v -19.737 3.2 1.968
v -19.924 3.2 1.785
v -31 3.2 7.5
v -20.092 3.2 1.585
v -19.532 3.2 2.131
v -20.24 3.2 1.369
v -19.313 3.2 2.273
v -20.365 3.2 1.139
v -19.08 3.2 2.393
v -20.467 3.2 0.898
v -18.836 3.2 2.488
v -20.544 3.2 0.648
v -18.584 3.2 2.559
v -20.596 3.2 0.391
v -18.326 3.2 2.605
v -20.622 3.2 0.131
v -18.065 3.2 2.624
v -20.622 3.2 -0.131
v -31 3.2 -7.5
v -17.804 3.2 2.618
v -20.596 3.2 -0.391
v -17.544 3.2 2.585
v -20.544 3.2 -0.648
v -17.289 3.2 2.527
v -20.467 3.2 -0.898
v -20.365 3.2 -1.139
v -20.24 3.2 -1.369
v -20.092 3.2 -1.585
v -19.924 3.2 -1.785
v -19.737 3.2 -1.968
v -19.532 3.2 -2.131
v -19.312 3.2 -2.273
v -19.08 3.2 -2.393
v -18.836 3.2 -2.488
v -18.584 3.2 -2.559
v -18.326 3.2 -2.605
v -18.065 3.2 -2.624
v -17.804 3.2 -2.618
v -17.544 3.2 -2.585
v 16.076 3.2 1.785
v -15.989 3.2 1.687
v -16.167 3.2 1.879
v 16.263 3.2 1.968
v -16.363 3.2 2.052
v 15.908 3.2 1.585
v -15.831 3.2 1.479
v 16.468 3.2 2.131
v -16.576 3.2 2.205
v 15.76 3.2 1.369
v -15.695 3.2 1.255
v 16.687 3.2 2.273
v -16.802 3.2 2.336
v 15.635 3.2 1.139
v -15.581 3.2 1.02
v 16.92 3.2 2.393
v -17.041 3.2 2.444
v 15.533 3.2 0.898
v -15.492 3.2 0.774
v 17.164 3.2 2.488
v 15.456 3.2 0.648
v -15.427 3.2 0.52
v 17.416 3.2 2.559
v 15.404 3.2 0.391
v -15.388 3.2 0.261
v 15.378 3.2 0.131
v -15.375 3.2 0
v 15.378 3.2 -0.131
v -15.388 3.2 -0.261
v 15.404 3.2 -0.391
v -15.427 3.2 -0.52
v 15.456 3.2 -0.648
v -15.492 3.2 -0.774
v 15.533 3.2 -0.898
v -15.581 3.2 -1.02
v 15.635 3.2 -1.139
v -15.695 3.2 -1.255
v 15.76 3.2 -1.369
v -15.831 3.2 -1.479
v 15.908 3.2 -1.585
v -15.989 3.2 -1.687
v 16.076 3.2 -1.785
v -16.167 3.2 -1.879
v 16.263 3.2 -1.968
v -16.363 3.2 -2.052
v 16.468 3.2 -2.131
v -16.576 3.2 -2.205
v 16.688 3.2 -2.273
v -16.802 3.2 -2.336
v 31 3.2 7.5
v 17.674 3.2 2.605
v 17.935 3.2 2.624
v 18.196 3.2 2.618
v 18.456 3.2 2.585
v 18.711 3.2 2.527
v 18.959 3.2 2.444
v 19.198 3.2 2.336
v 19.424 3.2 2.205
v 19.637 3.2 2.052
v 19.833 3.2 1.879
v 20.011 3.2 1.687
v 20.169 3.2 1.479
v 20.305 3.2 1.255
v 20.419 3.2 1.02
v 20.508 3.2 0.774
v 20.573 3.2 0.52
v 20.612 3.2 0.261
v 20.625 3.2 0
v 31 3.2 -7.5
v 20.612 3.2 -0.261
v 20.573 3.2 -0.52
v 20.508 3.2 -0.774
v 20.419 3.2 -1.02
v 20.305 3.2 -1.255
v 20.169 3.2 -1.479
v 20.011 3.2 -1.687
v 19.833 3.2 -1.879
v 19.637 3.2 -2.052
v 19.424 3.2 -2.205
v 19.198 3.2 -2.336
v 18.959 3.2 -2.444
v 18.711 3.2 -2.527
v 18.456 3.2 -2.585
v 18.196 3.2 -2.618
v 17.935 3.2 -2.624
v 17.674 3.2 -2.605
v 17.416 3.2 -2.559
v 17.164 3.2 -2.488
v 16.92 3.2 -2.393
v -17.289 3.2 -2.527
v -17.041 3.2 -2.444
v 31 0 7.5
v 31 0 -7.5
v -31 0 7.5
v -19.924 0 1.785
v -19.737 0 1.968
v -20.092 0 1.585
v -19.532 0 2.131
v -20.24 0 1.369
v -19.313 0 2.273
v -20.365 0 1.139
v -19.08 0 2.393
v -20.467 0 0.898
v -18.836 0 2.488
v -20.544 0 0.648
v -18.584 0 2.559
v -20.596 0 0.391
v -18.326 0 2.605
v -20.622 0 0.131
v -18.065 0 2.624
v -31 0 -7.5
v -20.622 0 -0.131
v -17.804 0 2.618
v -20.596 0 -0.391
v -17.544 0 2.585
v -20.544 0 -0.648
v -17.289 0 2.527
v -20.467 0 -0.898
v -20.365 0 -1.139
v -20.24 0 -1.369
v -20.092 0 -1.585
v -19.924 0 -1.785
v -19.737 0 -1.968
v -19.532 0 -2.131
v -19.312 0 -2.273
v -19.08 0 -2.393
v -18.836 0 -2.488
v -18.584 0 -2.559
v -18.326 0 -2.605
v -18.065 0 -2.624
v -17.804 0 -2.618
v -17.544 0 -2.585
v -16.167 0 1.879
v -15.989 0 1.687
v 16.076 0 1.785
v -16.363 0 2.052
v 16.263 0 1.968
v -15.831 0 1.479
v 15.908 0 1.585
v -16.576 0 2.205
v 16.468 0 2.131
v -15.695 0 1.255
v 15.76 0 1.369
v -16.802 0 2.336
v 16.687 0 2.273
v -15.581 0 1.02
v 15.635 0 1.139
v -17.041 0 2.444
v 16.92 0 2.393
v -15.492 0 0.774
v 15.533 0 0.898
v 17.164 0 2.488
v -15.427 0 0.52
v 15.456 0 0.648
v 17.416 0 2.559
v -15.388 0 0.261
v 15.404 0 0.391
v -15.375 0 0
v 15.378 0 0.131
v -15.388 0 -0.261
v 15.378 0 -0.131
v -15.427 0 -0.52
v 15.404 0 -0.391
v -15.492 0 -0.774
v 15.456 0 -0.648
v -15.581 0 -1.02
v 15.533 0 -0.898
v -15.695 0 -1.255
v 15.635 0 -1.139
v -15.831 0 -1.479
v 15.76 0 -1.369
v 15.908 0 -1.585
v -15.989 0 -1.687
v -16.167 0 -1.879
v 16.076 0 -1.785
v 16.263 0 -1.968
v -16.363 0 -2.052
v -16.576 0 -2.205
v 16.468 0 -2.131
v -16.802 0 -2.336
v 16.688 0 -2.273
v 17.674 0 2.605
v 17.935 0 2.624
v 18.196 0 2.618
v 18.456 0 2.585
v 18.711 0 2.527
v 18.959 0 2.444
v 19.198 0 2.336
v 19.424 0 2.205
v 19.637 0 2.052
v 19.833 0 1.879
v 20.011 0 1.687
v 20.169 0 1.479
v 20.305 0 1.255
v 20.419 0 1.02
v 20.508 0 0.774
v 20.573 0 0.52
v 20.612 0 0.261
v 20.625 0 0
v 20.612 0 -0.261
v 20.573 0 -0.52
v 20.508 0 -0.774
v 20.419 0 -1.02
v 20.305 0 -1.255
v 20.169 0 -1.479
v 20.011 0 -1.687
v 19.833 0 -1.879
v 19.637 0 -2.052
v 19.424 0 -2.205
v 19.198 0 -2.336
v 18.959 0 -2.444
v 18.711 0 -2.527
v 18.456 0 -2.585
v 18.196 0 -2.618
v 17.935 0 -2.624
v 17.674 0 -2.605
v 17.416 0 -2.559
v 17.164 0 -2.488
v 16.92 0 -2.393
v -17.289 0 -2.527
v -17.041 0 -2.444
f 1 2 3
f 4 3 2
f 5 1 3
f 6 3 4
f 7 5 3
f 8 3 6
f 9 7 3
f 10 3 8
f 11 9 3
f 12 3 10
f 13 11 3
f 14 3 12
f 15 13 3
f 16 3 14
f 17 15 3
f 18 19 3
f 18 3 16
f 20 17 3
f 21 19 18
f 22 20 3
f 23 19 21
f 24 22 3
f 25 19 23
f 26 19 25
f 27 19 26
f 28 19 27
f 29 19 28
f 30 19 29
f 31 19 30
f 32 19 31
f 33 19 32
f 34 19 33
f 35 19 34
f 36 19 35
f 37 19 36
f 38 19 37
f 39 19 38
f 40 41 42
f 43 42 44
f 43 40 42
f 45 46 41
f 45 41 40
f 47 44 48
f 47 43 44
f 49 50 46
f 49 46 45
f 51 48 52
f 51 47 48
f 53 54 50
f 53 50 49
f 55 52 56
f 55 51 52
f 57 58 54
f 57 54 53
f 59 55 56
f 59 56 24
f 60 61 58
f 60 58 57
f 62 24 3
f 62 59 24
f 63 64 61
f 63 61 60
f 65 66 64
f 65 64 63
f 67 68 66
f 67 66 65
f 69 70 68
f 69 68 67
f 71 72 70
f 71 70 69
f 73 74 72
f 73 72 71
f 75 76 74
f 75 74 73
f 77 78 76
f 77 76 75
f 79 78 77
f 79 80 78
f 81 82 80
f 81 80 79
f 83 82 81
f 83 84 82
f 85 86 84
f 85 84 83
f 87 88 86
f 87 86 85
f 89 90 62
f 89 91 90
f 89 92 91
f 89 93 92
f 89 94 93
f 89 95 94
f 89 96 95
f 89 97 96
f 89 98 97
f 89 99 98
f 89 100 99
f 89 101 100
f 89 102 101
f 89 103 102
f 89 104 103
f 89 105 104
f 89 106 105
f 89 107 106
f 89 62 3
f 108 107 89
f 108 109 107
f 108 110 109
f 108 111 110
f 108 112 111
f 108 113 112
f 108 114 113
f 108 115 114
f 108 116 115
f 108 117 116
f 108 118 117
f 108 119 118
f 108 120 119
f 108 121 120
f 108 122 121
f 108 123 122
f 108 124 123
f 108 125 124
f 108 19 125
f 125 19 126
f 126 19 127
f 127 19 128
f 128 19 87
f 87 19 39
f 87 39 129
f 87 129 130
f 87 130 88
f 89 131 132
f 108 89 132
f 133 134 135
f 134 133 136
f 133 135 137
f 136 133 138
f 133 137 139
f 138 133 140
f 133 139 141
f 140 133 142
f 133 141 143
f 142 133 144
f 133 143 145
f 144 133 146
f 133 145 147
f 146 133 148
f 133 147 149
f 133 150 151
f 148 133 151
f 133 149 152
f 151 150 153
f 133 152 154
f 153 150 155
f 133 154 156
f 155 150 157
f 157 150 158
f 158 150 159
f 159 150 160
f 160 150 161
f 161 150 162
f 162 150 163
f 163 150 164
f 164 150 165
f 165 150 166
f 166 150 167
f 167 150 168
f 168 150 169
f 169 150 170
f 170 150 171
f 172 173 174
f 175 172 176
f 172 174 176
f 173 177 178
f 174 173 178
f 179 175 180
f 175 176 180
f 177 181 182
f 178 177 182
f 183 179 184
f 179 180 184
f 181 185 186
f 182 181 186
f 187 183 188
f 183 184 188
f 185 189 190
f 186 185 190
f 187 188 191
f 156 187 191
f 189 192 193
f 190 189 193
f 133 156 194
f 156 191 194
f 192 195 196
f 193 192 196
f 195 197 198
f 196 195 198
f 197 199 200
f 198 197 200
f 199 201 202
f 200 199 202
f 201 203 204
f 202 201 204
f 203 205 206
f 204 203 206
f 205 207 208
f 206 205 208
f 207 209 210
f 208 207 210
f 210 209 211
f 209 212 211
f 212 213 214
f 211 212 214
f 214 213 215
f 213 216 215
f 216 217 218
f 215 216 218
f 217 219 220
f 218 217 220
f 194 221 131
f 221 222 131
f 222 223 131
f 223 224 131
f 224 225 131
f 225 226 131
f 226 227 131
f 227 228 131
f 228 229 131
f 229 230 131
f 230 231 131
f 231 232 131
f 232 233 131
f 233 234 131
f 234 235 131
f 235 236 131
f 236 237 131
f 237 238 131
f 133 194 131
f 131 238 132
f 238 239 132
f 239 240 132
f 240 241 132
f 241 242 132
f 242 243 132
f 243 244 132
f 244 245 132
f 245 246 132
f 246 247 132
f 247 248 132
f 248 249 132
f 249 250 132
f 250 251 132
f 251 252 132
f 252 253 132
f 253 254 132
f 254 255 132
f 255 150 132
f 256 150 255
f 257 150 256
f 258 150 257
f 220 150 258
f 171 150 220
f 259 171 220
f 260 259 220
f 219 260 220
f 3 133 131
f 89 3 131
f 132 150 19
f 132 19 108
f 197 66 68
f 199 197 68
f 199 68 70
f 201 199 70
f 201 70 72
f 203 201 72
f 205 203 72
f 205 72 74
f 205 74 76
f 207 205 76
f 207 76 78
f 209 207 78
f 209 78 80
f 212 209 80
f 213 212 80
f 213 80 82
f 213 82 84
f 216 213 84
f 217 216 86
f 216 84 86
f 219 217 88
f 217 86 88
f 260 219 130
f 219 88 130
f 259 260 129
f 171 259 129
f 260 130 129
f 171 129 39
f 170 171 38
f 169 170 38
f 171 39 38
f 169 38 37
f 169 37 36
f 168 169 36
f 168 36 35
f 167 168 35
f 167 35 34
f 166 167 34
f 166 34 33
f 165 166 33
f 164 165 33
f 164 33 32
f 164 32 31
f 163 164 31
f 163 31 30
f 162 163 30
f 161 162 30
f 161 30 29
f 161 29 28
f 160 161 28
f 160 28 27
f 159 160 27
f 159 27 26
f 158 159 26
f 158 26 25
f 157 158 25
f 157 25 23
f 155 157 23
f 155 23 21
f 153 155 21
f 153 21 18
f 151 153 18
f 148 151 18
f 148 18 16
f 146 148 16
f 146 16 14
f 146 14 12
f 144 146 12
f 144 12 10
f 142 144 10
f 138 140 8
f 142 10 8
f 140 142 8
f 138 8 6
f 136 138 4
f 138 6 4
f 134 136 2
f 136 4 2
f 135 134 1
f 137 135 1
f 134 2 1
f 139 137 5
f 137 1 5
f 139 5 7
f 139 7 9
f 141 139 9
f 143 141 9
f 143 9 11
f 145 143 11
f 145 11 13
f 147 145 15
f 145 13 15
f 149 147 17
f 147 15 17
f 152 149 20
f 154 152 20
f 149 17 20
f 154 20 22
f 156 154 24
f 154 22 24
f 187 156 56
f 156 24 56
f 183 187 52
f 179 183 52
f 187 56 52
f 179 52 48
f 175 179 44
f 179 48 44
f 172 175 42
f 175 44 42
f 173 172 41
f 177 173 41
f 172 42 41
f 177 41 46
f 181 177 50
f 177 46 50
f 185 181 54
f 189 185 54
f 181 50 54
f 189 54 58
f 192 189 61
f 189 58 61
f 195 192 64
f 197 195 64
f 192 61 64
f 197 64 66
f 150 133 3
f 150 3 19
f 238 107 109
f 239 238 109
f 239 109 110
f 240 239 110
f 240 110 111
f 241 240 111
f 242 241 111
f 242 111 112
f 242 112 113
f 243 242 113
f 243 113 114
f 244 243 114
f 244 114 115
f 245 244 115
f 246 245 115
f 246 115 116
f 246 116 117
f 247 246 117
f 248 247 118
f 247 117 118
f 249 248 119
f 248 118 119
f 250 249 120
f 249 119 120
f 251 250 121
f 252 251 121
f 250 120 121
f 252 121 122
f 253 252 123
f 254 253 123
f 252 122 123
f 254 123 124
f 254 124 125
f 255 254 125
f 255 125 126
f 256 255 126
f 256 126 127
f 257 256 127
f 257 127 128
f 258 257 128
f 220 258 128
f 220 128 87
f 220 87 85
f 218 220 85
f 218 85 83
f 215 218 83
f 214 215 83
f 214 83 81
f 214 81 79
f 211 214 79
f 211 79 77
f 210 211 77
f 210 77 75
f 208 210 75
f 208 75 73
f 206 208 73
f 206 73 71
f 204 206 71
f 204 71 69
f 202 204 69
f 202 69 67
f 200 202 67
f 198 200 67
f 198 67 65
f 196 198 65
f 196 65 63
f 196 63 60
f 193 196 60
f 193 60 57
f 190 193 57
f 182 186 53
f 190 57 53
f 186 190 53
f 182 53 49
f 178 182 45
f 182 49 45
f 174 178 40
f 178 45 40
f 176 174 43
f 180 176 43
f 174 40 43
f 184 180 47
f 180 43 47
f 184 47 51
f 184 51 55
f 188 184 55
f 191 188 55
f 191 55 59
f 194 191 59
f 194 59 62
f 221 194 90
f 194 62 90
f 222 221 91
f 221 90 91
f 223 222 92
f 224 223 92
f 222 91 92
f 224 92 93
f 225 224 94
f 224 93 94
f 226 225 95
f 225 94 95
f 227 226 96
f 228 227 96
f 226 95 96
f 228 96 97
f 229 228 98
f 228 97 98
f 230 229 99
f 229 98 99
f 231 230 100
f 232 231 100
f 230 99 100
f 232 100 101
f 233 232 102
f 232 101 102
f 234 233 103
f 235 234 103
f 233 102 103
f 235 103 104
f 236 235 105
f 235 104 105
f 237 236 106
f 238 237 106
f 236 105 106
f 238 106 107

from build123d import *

# Parameters (mm, degrees)
SKETCH1_W           = 62
SKETCH1_H           = 15
BOSS_EXTRUDE1_DEPTH = 3.2
CUT_EXTRUDE1_REACH  = 5.2
SKETCH2_R           = 2.625


with BuildPart() as part:
    # Sketch1 → Boss-Extrude1 (new body)
    with BuildSketch(Plane(origin=(0, 0, 0), x_dir=(1, 0, 0), z_dir=(0, 1, 0))):
        Rectangle(SKETCH1_W, SKETCH1_H)
    extrude(amount=BOSS_EXTRUDE1_DEPTH)

    # Sketch2 → Cut-Extrude1 (cut, up to next)
    with BuildSketch(Plane(origin=(0, 3.2, 0), x_dir=(1, 0, 0), z_dir=(0, 1, 0)), mode=Mode.PRIVATE) as cut_extrude1_sk1:
        with Locations((-18, 0)):
            Circle(SKETCH2_R)
    cut_extrude1_tool1 = extrude(cut_extrude1_sk1.sketch, amount=-CUT_EXTRUDE1_REACH, mode=Mode.PRIVATE) & part.part
    add(cut_extrude1_tool1.solids().sort_by_distance((-18, 3.2, 0))[0], mode=Mode.SUBTRACT)
    # Sketch2 → Cut-Extrude1 (cut, up to next)
    with BuildSketch(Plane(origin=(0, 3.2, 0), x_dir=(1, 0, 0), z_dir=(0, 1, 0)), mode=Mode.PRIVATE) as cut_extrude1_sk2:
        with Locations((18, 0)):
            Circle(SKETCH2_R)
    cut_extrude1_tool2 = extrude(cut_extrude1_sk2.sketch, amount=-CUT_EXTRUDE1_REACH, mode=Mode.PRIVATE) & part.part
    add(cut_extrude1_tool2.solids().sort_by_distance((18, 3.2, 0))[0], mode=Mode.SUBTRACT)


solid = part.part
